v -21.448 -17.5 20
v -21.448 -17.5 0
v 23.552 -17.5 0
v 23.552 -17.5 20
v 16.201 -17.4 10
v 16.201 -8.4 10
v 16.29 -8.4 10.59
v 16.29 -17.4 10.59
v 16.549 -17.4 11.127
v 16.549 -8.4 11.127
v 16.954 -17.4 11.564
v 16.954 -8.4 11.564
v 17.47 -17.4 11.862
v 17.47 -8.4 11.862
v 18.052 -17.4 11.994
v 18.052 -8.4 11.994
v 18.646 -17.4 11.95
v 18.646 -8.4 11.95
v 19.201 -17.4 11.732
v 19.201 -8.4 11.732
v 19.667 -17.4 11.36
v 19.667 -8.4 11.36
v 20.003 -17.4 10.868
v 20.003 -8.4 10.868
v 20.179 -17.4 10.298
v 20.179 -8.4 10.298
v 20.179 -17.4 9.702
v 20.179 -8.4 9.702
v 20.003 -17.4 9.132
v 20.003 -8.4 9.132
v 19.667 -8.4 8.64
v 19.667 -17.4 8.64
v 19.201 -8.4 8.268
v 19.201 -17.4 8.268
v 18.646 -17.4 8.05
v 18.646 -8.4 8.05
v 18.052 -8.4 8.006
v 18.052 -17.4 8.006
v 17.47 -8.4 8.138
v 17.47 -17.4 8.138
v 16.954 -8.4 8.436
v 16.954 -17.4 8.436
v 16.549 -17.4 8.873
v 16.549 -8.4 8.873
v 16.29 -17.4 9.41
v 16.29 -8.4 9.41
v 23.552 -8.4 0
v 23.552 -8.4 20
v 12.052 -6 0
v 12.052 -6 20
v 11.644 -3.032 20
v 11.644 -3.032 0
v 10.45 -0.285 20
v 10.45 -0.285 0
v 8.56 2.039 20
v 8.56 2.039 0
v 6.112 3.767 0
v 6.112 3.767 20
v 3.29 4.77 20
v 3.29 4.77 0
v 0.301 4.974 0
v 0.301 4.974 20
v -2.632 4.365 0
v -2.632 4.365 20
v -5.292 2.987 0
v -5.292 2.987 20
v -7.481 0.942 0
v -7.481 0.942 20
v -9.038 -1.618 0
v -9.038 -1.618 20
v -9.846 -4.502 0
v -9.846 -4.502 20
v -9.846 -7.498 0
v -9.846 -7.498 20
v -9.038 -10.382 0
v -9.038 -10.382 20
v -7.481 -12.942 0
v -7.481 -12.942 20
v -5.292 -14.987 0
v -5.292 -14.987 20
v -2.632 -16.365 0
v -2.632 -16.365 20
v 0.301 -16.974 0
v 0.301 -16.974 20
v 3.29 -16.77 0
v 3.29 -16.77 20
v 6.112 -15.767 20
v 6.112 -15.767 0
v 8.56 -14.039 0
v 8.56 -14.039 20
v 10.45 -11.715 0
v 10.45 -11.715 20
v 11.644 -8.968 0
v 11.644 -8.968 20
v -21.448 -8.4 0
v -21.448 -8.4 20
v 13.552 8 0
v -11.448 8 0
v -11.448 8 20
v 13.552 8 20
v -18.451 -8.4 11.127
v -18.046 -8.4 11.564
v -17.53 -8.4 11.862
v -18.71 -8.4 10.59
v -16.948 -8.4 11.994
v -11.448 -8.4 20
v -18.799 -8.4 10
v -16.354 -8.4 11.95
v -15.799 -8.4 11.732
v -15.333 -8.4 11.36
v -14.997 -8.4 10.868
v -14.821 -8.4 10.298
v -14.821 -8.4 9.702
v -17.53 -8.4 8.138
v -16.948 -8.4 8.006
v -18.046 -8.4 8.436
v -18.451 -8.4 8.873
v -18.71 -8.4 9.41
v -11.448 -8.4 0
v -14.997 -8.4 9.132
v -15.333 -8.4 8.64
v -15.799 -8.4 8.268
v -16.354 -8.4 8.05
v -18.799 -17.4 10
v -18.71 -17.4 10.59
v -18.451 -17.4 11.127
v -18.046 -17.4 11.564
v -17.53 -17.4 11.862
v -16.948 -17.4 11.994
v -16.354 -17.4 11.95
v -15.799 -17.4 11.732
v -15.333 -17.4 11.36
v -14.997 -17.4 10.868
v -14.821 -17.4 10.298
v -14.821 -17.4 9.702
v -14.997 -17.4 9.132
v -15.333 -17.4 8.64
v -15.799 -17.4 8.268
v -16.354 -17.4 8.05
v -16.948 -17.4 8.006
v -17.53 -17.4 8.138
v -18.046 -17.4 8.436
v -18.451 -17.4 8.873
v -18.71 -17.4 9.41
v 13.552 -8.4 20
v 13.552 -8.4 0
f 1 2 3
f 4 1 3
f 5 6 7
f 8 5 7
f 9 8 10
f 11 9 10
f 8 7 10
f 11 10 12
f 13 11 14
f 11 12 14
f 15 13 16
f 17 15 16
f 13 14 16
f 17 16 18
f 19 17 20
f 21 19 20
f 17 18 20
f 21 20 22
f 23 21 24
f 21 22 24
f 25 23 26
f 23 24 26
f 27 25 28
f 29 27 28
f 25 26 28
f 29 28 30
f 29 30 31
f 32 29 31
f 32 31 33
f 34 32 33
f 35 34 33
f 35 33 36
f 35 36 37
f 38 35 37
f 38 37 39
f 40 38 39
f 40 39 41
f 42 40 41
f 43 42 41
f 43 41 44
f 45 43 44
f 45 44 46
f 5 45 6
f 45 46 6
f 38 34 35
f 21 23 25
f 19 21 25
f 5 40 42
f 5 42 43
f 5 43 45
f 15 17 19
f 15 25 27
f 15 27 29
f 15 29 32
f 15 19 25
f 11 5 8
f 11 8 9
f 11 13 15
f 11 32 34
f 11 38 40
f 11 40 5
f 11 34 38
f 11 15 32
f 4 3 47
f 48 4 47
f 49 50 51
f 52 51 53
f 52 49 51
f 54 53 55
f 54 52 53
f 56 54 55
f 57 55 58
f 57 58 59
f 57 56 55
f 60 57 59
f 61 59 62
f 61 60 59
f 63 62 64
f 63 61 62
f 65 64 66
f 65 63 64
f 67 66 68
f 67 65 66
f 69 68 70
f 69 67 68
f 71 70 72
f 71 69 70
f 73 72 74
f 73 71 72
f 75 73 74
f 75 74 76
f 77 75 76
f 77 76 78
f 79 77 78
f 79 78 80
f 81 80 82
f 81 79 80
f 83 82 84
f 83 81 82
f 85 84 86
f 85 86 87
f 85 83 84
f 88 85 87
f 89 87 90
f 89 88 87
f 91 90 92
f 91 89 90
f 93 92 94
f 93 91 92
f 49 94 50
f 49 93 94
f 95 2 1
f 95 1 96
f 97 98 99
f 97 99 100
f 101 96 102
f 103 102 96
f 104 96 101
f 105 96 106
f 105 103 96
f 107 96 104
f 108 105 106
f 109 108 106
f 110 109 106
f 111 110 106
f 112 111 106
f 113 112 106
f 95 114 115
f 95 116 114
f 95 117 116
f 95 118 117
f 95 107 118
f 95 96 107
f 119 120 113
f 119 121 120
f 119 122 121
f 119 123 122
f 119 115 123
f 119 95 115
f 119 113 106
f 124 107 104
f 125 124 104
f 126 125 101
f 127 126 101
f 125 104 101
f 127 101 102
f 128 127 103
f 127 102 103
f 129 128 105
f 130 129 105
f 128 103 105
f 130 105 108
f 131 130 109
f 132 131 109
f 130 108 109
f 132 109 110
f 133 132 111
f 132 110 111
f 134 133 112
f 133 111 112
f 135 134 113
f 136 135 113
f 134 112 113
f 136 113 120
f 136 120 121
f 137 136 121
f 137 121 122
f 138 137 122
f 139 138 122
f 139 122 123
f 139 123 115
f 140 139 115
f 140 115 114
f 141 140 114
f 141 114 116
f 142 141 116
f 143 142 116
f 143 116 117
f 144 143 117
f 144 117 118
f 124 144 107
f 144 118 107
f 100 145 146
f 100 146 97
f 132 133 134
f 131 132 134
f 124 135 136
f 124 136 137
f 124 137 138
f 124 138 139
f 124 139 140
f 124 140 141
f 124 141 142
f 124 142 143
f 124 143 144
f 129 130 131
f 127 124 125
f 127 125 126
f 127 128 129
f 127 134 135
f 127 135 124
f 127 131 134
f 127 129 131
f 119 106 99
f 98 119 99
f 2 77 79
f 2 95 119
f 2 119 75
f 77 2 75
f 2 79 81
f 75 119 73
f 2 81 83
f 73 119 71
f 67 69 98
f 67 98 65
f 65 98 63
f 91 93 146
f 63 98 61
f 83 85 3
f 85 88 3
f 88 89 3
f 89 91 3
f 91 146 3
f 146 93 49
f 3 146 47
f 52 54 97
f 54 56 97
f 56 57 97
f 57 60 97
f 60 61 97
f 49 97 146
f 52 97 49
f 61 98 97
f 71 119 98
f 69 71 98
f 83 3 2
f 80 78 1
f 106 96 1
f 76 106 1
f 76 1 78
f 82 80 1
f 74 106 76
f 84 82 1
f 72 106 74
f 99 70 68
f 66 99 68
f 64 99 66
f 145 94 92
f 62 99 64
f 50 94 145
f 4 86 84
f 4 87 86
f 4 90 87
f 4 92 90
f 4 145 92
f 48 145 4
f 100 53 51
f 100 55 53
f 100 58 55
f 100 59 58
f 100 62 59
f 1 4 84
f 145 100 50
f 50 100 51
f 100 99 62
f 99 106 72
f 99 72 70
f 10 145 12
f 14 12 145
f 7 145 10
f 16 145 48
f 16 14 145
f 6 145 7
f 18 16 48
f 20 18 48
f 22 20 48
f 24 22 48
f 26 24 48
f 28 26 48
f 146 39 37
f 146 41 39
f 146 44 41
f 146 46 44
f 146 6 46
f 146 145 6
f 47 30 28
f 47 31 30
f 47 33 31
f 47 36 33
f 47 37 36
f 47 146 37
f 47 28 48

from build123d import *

# Parameters (mm, degrees)
SKETCH1_W           = 25
SKETCH1_H           = 25.5
SKETCH1_R           = 11
SKETCH1_W_2         = 10
SKETCH1_H_2         = 9.1
BOSS_EXTRUDE1_DEPTH = 20
SKETCH2_R           = 2
CUT_EXTRUDE1_DEPTH  = 9


with BuildPart() as part:
    # Sketch1 → Boss-Extrude1 (new body)
    # profile 1 of 3: a face of its own
    with BuildSketch(Plane.XY):
        with Locations((1.051746227, -4.75)):
            Rectangle(SKETCH1_W, SKETCH1_H)
        with Locations((1.051746227, -6)):
            Circle(SKETCH1_R, mode=Mode.SUBTRACT)
    # profile 2 of 3: a face of its own
    with BuildSketch(Plane.XY):
        with Locations((-16.448253773, -12.95)):
            Rectangle(SKETCH1_W_2, SKETCH1_H_2)
    # profile 3 of 3: a face of its own
    with BuildSketch(Plane.XY):
        with Locations((18.551746227, -12.95)):
            Rectangle(SKETCH1_W_2, SKETCH1_H_2)
    extrude(amount=BOSS_EXTRUDE1_DEPTH)

    # Sketch2 → Cut-Extrude1 (cut)
    with BuildSketch(Plane(origin=(0, -8.4, 0), x_dir=(1, 0, 0), z_dir=(0, 1, 0))):
        with Locations(Location((-16.798835848, -10, 0), (0, 0, 180))):
            Circle(SKETCH2_R)
        with Locations(Location((18.201164152, -10, 0), (0, 0, 180))):
            Circle(SKETCH2_R)
    extrude(amount=-CUT_EXTRUDE1_DEPTH, mode=Mode.SUBTRACT)


solid = part.part
